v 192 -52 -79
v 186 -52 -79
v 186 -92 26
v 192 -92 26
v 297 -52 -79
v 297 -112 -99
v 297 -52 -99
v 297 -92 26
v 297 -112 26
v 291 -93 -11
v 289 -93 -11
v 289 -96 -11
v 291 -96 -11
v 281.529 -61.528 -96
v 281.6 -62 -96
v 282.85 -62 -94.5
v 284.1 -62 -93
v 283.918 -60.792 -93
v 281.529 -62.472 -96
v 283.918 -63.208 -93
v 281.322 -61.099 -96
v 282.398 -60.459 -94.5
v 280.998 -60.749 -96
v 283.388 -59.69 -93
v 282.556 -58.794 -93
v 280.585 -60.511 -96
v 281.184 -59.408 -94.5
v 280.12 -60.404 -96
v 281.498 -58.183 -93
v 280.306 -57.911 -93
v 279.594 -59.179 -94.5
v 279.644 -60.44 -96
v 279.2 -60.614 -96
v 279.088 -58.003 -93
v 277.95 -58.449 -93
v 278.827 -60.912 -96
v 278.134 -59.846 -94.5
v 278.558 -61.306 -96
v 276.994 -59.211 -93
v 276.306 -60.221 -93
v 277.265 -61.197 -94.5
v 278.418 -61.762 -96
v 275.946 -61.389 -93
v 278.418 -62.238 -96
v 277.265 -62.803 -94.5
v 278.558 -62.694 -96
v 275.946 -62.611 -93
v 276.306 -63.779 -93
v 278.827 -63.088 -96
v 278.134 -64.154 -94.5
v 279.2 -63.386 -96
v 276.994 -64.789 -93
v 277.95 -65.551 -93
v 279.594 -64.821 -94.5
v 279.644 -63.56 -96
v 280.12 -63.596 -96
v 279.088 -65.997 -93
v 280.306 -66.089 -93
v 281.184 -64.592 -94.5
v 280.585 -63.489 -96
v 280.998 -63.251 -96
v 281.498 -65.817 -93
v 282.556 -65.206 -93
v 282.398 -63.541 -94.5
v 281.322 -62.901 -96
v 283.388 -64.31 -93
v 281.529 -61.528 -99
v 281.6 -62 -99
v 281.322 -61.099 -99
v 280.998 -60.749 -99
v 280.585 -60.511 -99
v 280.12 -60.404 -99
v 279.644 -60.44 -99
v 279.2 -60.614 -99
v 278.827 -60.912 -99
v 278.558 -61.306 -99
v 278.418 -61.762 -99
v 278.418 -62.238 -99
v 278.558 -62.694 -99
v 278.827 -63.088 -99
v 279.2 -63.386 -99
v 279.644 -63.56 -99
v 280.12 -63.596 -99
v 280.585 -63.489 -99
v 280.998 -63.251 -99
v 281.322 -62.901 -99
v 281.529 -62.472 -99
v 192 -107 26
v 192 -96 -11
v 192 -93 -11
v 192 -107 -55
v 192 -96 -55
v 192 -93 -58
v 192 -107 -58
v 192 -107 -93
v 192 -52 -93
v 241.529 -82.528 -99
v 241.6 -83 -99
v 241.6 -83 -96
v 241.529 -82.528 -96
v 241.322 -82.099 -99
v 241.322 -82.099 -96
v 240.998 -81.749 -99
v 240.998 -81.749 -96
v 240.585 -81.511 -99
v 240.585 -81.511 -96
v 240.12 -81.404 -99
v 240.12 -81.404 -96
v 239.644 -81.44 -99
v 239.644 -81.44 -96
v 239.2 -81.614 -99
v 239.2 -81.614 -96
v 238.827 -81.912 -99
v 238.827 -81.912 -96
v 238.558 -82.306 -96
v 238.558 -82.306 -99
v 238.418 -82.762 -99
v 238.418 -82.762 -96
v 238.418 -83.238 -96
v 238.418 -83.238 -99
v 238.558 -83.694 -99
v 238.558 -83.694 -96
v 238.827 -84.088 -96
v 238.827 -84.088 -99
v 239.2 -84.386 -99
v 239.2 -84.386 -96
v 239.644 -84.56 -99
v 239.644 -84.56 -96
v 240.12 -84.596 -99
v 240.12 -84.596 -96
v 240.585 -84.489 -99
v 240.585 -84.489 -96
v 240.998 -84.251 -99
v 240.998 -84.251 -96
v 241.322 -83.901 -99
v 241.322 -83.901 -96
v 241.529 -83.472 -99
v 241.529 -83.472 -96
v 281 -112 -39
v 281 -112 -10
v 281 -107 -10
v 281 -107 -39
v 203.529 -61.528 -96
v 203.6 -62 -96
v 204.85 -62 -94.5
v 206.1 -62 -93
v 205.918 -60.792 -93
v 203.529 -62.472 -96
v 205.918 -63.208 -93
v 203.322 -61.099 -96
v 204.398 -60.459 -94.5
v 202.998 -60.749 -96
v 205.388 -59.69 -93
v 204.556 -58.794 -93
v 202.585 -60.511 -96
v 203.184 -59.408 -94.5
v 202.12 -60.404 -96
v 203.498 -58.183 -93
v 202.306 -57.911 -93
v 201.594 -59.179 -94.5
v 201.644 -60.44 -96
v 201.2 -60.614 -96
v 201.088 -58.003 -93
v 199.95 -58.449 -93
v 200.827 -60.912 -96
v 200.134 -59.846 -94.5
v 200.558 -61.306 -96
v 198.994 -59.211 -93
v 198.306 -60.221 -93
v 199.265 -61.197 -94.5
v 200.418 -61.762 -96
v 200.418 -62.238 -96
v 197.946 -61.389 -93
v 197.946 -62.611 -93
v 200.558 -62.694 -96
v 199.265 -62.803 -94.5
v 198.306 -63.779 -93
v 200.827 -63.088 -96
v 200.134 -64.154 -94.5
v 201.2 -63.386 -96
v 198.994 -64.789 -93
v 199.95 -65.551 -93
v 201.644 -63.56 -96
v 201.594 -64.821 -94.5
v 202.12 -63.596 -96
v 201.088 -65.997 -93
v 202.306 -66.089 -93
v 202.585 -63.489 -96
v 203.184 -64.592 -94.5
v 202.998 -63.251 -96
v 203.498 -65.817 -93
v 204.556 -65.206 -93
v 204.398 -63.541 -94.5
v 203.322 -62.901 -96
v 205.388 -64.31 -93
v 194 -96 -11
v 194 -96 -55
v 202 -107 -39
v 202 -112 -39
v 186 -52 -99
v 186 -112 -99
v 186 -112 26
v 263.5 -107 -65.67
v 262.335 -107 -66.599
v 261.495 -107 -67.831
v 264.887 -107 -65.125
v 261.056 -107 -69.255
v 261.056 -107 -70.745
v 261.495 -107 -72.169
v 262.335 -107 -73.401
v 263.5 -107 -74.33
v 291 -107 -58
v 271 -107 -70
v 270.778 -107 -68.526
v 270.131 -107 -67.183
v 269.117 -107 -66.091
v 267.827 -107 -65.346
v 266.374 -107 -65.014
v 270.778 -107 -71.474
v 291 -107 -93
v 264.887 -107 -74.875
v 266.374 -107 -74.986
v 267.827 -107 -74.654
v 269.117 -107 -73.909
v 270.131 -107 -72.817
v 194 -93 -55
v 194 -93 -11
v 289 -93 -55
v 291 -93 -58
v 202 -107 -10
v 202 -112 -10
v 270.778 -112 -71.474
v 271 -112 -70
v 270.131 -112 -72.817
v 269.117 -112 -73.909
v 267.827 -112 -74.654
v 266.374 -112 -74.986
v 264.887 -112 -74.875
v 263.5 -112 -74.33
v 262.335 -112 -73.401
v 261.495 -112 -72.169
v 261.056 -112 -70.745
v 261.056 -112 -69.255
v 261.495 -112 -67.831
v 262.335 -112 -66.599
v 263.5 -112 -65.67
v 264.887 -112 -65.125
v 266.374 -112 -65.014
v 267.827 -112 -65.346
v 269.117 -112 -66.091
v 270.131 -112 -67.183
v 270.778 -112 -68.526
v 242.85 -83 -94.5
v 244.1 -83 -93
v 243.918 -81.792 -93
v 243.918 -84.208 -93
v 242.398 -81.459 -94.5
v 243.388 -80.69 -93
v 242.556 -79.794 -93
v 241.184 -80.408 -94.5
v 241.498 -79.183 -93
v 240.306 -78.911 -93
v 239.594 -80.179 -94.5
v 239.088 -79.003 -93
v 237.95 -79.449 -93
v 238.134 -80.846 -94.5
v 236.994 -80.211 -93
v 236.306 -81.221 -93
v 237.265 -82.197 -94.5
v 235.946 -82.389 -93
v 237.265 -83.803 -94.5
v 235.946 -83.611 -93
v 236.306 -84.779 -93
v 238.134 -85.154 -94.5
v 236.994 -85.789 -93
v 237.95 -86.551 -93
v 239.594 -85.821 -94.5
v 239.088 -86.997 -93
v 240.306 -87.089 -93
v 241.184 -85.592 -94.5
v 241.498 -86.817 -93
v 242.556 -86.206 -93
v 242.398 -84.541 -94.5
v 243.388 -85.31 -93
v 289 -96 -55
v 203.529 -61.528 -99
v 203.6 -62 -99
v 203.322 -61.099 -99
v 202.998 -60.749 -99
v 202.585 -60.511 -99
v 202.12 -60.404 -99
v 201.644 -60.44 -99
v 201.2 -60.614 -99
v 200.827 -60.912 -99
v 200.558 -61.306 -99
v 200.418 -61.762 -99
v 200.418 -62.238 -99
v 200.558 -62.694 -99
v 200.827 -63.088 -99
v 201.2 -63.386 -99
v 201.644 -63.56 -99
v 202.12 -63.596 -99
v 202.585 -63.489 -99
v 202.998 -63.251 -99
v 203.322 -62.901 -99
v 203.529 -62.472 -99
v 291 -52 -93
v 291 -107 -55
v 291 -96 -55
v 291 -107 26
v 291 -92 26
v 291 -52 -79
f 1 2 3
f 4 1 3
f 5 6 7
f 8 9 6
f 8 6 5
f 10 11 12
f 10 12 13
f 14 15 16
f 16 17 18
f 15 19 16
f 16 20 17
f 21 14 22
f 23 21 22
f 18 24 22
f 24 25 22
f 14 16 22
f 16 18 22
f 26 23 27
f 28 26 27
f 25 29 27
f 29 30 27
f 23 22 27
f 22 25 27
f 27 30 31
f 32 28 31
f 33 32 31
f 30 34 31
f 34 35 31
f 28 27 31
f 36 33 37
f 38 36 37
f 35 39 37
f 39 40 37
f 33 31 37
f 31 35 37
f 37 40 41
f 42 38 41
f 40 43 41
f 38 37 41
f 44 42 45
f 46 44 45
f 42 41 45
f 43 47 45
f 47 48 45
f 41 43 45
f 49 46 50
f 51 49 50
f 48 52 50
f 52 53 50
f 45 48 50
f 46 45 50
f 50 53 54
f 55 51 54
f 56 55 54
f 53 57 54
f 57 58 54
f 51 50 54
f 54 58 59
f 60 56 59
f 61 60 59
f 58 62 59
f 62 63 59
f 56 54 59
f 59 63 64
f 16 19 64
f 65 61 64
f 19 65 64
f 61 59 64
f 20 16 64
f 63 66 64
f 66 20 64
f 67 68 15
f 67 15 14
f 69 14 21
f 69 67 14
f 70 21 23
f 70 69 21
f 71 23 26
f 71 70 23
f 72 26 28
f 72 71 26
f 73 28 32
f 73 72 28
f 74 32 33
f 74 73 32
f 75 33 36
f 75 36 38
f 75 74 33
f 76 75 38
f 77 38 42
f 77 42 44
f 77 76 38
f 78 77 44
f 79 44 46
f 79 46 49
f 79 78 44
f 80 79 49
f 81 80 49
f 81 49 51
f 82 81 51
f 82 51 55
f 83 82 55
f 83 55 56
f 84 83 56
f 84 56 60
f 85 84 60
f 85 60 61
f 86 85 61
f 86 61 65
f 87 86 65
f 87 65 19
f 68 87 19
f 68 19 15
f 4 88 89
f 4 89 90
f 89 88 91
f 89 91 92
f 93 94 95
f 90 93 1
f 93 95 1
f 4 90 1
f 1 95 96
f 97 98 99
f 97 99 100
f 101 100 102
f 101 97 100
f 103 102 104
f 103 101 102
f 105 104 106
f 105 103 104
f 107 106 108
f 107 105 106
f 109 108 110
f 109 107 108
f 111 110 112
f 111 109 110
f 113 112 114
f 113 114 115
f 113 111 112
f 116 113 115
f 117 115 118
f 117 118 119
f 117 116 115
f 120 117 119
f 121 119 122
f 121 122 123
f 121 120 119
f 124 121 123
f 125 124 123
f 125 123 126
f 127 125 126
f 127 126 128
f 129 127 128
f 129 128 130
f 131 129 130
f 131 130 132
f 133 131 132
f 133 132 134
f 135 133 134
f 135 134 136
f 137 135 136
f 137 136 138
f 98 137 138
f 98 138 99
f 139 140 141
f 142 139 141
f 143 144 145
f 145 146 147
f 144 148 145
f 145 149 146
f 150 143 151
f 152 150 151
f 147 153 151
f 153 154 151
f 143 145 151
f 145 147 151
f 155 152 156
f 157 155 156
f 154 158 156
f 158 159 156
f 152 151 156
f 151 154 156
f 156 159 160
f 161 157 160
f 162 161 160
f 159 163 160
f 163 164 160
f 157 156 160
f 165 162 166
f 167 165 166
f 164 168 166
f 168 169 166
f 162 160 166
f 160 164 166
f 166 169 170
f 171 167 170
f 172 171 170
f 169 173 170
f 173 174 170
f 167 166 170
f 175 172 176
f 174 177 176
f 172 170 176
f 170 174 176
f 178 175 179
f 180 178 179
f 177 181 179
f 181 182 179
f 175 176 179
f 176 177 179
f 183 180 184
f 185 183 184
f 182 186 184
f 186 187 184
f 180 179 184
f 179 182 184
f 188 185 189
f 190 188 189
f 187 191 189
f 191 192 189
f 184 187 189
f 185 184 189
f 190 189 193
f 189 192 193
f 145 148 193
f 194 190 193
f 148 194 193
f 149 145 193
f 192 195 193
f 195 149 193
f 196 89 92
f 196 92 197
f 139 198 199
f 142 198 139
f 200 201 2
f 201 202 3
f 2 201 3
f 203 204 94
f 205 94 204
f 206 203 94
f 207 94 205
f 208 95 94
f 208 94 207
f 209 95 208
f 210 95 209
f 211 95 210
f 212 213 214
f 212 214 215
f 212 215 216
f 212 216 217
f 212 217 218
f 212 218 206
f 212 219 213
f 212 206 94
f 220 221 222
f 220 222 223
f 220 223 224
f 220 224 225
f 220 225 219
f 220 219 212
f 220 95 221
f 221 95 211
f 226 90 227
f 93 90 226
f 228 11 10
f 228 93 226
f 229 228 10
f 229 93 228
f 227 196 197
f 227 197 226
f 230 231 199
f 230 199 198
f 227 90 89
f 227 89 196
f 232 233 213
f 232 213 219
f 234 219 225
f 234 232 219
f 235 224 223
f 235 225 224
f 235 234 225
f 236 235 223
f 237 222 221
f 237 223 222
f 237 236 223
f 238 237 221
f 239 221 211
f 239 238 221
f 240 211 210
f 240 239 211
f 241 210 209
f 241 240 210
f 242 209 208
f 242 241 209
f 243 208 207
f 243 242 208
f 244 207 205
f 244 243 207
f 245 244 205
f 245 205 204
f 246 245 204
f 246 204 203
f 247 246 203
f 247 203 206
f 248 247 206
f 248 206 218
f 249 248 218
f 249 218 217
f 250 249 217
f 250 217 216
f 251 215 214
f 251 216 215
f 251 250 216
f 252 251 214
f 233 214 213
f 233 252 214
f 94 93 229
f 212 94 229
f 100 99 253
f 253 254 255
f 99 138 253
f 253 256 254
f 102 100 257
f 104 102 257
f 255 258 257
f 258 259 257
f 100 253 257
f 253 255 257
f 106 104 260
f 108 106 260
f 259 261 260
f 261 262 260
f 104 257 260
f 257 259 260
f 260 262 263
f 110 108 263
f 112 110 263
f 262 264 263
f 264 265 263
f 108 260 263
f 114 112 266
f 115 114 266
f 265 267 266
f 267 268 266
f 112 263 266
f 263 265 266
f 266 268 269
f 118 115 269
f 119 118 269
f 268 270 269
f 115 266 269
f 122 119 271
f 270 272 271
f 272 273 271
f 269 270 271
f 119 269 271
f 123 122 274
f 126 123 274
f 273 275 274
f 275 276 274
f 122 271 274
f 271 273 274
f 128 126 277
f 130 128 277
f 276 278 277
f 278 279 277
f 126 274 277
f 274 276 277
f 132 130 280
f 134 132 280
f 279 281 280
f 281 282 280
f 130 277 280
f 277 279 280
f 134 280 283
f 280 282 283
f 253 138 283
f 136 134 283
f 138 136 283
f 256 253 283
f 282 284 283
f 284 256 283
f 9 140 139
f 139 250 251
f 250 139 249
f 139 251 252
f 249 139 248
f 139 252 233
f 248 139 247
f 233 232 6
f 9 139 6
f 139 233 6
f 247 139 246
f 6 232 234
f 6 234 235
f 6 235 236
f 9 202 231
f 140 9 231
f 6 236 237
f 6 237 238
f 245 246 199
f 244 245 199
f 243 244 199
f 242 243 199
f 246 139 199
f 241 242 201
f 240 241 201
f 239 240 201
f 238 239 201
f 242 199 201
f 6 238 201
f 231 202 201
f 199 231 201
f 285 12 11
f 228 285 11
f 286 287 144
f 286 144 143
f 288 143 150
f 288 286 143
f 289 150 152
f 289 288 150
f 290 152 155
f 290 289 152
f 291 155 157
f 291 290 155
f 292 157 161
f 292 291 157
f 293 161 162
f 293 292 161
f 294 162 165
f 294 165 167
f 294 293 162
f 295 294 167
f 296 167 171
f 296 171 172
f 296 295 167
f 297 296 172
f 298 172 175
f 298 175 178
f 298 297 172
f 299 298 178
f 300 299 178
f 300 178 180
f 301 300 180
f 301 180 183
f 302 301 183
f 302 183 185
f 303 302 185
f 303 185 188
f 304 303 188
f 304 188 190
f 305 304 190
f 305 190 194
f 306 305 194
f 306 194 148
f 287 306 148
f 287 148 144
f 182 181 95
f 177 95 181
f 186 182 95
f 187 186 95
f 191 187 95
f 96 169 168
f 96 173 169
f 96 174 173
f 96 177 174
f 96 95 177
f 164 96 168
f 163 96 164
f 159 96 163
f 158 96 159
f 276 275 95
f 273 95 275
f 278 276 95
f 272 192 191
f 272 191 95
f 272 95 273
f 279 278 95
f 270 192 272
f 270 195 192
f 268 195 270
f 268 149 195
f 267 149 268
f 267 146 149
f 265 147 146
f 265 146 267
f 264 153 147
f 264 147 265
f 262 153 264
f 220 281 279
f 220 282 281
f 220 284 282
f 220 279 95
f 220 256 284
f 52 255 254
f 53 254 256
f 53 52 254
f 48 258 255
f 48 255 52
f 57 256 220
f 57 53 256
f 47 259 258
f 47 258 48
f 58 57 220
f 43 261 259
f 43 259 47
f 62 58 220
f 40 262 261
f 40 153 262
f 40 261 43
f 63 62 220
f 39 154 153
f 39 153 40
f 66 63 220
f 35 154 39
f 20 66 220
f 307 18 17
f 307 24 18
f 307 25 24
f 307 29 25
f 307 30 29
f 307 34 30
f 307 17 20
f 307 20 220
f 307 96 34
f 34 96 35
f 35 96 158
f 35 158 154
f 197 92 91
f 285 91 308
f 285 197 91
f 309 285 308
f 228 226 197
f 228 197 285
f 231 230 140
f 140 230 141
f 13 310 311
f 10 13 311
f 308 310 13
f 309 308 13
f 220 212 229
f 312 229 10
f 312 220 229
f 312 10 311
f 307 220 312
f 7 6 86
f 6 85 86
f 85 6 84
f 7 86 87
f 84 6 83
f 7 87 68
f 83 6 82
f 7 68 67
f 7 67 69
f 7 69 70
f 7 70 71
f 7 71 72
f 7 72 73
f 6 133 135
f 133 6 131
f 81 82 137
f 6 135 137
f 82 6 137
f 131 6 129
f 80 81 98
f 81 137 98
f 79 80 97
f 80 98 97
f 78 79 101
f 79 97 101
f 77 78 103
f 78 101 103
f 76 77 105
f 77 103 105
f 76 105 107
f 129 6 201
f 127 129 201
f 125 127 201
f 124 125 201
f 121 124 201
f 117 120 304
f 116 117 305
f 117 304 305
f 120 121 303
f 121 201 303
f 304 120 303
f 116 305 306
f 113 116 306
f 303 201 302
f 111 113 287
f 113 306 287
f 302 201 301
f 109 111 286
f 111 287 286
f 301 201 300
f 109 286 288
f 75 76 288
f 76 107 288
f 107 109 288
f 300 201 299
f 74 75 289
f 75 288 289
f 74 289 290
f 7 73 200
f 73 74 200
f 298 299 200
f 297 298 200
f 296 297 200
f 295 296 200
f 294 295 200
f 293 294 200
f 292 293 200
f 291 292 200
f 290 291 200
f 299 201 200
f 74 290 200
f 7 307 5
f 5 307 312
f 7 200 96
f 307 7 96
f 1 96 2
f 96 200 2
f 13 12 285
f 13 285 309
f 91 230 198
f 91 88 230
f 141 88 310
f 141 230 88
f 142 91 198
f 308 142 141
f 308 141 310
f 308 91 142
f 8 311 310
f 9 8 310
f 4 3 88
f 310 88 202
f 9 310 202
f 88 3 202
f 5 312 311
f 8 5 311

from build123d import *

# Parameters (mm, degrees)
CYLINDER056_R     = 1.6
CYLINDER056_DEPTH = 10
CYLINDER057_R     = 5
CYLINDER057_DEPTH = 25
BOX014_W          = 79
BOX014_H          = 10
BOX014_DEPTH      = 29
BOX015_W          = 3
BOX015_H          = 3
BOX015_DEPTH      = 44
BOX016_W          = 3
BOX016_H          = 3
BOX016_DEPTH      = 44
BOX017_W          = 101
BOX017_H          = 15
BOX017_DEPTH      = 3
BOX013_W          = 99
BOX013_H          = 60
BOX013_DEPTH      = 128
EXTRUDE017_DEPTH  = 111


with BuildPart() as cono001:
    # Cone001 → Cone001 (revolve)
    with BuildSketch(Plane(origin=(0, 0, -96), x_dir=(1, 0, 0), z_dir=(0, -1, 0))):
        Polygon((0, 0), (1.6, 0), (4.1, 3), (0, 3), align=None)
    revolve(axis=Axis((0, 0, -96), (0, 0, 1)))


with BuildPart() as cilindro056:
    # Cylinder056 → Cylinder056 (new body)
    with BuildSketch(Plane.XY.offset(-106)):
        Circle(CYLINDER056_R)
    extrude(amount=CYLINDER056_DEPTH)


with BuildPart() as fusion037:
    # Fusion037 base: copy of Cilindro056
    add(cilindro056.part)

    # Fusion037: union Cono001
    add(cono001.part)


with BuildPart() as fusion037_1:
    # Fusion037 placement: moved
    add(fusion037.part.moved(Location((202, -62, 0))))


with BuildPart() as fusion038:
    # Fusion038 base: copy of Cilindro056
    add(cilindro056.part)

    # Fusion038: union Cono001
    add(cono001.part)


with BuildPart() as fusion038_1:
    # Fusion038 placement: moved
    add(fusion038.part.moved(Location((240, -83, 0))))


with BuildPart() as fusion039:
    # Fusion039 base: copy of Cilindro056
    add(cilindro056.part)

    # Fusion039: union Cono001
    add(cono001.part)


with BuildPart() as fusion039_1:
    # Fusion039 placement: moved
    add(fusion039.part.moved(Location((280, -62, 0))))


with BuildPart() as cilindro057:
    # Cylinder057 → Cylinder057 (new body)
    with BuildSketch(Plane(origin=(266, -119, -70), x_dir=(1, 0, 0), z_dir=(0, 1, 0))):
        Circle(CYLINDER057_R)
    extrude(amount=CYLINDER057_DEPTH)


with BuildPart() as fusion040:
    # Box014 → Box014 (new body)
    with BuildSketch(Plane(origin=(202, -112, -39), x_dir=(1, 0, 0), z_dir=(0, 0, 1))):
        with Locations((39.5, 5)):
            Rectangle(BOX014_W, BOX014_H)
    extrude(amount=BOX014_DEPTH)

    # Fusion040: union Fusion037, Fusion038, Fusion039, Cilindro057
    add(fusion037_1.part)
    add(fusion038_1.part)
    add(fusion039_1.part)
    add(cilindro057.part)


with BuildPart() as cubo014:
    # Box015 → Box015 (new body)
    with BuildSketch(Plane(origin=(289, -96, -55), x_dir=(1, 0, 0), z_dir=(0, 0, 1))):
        with Locations((1.5, 1.5)):
            Rectangle(BOX015_W, BOX015_H)
    extrude(amount=BOX015_DEPTH)


with BuildPart() as cubo015:
    # Box016 → Box016 (new body)
    with BuildSketch(Plane(origin=(191, -96, -55), x_dir=(1, 0, 0), z_dir=(0, 0, 1))):
        with Locations((1.5, 1.5)):
            Rectangle(BOX016_W, BOX016_H)
    extrude(amount=BOX016_DEPTH)


with BuildPart() as cubo016:
    # Box017 → Box017 (new body)
    with BuildSketch(Plane(origin=(191, -108, -58), x_dir=(1, 0, 0), z_dir=(0, 0, 1))):
        with Locations((50.5, 7.5)):
            Rectangle(BOX017_W, BOX017_H)
    extrude(amount=BOX017_DEPTH)


with BuildPart() as cubo012:
    # Box013 → Box013 (new body)
    with BuildSketch(Plane(origin=(132, 23, -93), x_dir=(1, 0, 0), z_dir=(0, 0, 1))):
        with Locations((49.5, 30)):
            Rectangle(BOX013_W, BOX013_H)
    extrude(amount=BOX013_DEPTH)


with BuildPart() as soporte_lcd:
    # Sketch013 → Extrude017 (new body)
    with BuildSketch(Plane.YZ.offset(126)):
        Polygon((18, 26), (18, -99), (78, -99), (78, -79), (38, 26), align=None)
    extrude(amount=EXTRUDE017_DEPTH)

    # Cut016: cut Cubo012
    add(cubo012.part, mode=Mode.SUBTRACT)


with BuildPart() as soporte_lcd_1:
    # Cut016 placement: moved
    add(soporte_lcd.part.moved(Location((60, -130, 0))))

    # Fusion041: union Cubo014, Cubo015, Cubo016
    add(cubo014.part)
    add(cubo015.part)
    add(cubo016.part)

    # Cut017: cut Fusion040
    add(fusion040.part, mode=Mode.SUBTRACT)


solid = soporte_lcd_1.part
